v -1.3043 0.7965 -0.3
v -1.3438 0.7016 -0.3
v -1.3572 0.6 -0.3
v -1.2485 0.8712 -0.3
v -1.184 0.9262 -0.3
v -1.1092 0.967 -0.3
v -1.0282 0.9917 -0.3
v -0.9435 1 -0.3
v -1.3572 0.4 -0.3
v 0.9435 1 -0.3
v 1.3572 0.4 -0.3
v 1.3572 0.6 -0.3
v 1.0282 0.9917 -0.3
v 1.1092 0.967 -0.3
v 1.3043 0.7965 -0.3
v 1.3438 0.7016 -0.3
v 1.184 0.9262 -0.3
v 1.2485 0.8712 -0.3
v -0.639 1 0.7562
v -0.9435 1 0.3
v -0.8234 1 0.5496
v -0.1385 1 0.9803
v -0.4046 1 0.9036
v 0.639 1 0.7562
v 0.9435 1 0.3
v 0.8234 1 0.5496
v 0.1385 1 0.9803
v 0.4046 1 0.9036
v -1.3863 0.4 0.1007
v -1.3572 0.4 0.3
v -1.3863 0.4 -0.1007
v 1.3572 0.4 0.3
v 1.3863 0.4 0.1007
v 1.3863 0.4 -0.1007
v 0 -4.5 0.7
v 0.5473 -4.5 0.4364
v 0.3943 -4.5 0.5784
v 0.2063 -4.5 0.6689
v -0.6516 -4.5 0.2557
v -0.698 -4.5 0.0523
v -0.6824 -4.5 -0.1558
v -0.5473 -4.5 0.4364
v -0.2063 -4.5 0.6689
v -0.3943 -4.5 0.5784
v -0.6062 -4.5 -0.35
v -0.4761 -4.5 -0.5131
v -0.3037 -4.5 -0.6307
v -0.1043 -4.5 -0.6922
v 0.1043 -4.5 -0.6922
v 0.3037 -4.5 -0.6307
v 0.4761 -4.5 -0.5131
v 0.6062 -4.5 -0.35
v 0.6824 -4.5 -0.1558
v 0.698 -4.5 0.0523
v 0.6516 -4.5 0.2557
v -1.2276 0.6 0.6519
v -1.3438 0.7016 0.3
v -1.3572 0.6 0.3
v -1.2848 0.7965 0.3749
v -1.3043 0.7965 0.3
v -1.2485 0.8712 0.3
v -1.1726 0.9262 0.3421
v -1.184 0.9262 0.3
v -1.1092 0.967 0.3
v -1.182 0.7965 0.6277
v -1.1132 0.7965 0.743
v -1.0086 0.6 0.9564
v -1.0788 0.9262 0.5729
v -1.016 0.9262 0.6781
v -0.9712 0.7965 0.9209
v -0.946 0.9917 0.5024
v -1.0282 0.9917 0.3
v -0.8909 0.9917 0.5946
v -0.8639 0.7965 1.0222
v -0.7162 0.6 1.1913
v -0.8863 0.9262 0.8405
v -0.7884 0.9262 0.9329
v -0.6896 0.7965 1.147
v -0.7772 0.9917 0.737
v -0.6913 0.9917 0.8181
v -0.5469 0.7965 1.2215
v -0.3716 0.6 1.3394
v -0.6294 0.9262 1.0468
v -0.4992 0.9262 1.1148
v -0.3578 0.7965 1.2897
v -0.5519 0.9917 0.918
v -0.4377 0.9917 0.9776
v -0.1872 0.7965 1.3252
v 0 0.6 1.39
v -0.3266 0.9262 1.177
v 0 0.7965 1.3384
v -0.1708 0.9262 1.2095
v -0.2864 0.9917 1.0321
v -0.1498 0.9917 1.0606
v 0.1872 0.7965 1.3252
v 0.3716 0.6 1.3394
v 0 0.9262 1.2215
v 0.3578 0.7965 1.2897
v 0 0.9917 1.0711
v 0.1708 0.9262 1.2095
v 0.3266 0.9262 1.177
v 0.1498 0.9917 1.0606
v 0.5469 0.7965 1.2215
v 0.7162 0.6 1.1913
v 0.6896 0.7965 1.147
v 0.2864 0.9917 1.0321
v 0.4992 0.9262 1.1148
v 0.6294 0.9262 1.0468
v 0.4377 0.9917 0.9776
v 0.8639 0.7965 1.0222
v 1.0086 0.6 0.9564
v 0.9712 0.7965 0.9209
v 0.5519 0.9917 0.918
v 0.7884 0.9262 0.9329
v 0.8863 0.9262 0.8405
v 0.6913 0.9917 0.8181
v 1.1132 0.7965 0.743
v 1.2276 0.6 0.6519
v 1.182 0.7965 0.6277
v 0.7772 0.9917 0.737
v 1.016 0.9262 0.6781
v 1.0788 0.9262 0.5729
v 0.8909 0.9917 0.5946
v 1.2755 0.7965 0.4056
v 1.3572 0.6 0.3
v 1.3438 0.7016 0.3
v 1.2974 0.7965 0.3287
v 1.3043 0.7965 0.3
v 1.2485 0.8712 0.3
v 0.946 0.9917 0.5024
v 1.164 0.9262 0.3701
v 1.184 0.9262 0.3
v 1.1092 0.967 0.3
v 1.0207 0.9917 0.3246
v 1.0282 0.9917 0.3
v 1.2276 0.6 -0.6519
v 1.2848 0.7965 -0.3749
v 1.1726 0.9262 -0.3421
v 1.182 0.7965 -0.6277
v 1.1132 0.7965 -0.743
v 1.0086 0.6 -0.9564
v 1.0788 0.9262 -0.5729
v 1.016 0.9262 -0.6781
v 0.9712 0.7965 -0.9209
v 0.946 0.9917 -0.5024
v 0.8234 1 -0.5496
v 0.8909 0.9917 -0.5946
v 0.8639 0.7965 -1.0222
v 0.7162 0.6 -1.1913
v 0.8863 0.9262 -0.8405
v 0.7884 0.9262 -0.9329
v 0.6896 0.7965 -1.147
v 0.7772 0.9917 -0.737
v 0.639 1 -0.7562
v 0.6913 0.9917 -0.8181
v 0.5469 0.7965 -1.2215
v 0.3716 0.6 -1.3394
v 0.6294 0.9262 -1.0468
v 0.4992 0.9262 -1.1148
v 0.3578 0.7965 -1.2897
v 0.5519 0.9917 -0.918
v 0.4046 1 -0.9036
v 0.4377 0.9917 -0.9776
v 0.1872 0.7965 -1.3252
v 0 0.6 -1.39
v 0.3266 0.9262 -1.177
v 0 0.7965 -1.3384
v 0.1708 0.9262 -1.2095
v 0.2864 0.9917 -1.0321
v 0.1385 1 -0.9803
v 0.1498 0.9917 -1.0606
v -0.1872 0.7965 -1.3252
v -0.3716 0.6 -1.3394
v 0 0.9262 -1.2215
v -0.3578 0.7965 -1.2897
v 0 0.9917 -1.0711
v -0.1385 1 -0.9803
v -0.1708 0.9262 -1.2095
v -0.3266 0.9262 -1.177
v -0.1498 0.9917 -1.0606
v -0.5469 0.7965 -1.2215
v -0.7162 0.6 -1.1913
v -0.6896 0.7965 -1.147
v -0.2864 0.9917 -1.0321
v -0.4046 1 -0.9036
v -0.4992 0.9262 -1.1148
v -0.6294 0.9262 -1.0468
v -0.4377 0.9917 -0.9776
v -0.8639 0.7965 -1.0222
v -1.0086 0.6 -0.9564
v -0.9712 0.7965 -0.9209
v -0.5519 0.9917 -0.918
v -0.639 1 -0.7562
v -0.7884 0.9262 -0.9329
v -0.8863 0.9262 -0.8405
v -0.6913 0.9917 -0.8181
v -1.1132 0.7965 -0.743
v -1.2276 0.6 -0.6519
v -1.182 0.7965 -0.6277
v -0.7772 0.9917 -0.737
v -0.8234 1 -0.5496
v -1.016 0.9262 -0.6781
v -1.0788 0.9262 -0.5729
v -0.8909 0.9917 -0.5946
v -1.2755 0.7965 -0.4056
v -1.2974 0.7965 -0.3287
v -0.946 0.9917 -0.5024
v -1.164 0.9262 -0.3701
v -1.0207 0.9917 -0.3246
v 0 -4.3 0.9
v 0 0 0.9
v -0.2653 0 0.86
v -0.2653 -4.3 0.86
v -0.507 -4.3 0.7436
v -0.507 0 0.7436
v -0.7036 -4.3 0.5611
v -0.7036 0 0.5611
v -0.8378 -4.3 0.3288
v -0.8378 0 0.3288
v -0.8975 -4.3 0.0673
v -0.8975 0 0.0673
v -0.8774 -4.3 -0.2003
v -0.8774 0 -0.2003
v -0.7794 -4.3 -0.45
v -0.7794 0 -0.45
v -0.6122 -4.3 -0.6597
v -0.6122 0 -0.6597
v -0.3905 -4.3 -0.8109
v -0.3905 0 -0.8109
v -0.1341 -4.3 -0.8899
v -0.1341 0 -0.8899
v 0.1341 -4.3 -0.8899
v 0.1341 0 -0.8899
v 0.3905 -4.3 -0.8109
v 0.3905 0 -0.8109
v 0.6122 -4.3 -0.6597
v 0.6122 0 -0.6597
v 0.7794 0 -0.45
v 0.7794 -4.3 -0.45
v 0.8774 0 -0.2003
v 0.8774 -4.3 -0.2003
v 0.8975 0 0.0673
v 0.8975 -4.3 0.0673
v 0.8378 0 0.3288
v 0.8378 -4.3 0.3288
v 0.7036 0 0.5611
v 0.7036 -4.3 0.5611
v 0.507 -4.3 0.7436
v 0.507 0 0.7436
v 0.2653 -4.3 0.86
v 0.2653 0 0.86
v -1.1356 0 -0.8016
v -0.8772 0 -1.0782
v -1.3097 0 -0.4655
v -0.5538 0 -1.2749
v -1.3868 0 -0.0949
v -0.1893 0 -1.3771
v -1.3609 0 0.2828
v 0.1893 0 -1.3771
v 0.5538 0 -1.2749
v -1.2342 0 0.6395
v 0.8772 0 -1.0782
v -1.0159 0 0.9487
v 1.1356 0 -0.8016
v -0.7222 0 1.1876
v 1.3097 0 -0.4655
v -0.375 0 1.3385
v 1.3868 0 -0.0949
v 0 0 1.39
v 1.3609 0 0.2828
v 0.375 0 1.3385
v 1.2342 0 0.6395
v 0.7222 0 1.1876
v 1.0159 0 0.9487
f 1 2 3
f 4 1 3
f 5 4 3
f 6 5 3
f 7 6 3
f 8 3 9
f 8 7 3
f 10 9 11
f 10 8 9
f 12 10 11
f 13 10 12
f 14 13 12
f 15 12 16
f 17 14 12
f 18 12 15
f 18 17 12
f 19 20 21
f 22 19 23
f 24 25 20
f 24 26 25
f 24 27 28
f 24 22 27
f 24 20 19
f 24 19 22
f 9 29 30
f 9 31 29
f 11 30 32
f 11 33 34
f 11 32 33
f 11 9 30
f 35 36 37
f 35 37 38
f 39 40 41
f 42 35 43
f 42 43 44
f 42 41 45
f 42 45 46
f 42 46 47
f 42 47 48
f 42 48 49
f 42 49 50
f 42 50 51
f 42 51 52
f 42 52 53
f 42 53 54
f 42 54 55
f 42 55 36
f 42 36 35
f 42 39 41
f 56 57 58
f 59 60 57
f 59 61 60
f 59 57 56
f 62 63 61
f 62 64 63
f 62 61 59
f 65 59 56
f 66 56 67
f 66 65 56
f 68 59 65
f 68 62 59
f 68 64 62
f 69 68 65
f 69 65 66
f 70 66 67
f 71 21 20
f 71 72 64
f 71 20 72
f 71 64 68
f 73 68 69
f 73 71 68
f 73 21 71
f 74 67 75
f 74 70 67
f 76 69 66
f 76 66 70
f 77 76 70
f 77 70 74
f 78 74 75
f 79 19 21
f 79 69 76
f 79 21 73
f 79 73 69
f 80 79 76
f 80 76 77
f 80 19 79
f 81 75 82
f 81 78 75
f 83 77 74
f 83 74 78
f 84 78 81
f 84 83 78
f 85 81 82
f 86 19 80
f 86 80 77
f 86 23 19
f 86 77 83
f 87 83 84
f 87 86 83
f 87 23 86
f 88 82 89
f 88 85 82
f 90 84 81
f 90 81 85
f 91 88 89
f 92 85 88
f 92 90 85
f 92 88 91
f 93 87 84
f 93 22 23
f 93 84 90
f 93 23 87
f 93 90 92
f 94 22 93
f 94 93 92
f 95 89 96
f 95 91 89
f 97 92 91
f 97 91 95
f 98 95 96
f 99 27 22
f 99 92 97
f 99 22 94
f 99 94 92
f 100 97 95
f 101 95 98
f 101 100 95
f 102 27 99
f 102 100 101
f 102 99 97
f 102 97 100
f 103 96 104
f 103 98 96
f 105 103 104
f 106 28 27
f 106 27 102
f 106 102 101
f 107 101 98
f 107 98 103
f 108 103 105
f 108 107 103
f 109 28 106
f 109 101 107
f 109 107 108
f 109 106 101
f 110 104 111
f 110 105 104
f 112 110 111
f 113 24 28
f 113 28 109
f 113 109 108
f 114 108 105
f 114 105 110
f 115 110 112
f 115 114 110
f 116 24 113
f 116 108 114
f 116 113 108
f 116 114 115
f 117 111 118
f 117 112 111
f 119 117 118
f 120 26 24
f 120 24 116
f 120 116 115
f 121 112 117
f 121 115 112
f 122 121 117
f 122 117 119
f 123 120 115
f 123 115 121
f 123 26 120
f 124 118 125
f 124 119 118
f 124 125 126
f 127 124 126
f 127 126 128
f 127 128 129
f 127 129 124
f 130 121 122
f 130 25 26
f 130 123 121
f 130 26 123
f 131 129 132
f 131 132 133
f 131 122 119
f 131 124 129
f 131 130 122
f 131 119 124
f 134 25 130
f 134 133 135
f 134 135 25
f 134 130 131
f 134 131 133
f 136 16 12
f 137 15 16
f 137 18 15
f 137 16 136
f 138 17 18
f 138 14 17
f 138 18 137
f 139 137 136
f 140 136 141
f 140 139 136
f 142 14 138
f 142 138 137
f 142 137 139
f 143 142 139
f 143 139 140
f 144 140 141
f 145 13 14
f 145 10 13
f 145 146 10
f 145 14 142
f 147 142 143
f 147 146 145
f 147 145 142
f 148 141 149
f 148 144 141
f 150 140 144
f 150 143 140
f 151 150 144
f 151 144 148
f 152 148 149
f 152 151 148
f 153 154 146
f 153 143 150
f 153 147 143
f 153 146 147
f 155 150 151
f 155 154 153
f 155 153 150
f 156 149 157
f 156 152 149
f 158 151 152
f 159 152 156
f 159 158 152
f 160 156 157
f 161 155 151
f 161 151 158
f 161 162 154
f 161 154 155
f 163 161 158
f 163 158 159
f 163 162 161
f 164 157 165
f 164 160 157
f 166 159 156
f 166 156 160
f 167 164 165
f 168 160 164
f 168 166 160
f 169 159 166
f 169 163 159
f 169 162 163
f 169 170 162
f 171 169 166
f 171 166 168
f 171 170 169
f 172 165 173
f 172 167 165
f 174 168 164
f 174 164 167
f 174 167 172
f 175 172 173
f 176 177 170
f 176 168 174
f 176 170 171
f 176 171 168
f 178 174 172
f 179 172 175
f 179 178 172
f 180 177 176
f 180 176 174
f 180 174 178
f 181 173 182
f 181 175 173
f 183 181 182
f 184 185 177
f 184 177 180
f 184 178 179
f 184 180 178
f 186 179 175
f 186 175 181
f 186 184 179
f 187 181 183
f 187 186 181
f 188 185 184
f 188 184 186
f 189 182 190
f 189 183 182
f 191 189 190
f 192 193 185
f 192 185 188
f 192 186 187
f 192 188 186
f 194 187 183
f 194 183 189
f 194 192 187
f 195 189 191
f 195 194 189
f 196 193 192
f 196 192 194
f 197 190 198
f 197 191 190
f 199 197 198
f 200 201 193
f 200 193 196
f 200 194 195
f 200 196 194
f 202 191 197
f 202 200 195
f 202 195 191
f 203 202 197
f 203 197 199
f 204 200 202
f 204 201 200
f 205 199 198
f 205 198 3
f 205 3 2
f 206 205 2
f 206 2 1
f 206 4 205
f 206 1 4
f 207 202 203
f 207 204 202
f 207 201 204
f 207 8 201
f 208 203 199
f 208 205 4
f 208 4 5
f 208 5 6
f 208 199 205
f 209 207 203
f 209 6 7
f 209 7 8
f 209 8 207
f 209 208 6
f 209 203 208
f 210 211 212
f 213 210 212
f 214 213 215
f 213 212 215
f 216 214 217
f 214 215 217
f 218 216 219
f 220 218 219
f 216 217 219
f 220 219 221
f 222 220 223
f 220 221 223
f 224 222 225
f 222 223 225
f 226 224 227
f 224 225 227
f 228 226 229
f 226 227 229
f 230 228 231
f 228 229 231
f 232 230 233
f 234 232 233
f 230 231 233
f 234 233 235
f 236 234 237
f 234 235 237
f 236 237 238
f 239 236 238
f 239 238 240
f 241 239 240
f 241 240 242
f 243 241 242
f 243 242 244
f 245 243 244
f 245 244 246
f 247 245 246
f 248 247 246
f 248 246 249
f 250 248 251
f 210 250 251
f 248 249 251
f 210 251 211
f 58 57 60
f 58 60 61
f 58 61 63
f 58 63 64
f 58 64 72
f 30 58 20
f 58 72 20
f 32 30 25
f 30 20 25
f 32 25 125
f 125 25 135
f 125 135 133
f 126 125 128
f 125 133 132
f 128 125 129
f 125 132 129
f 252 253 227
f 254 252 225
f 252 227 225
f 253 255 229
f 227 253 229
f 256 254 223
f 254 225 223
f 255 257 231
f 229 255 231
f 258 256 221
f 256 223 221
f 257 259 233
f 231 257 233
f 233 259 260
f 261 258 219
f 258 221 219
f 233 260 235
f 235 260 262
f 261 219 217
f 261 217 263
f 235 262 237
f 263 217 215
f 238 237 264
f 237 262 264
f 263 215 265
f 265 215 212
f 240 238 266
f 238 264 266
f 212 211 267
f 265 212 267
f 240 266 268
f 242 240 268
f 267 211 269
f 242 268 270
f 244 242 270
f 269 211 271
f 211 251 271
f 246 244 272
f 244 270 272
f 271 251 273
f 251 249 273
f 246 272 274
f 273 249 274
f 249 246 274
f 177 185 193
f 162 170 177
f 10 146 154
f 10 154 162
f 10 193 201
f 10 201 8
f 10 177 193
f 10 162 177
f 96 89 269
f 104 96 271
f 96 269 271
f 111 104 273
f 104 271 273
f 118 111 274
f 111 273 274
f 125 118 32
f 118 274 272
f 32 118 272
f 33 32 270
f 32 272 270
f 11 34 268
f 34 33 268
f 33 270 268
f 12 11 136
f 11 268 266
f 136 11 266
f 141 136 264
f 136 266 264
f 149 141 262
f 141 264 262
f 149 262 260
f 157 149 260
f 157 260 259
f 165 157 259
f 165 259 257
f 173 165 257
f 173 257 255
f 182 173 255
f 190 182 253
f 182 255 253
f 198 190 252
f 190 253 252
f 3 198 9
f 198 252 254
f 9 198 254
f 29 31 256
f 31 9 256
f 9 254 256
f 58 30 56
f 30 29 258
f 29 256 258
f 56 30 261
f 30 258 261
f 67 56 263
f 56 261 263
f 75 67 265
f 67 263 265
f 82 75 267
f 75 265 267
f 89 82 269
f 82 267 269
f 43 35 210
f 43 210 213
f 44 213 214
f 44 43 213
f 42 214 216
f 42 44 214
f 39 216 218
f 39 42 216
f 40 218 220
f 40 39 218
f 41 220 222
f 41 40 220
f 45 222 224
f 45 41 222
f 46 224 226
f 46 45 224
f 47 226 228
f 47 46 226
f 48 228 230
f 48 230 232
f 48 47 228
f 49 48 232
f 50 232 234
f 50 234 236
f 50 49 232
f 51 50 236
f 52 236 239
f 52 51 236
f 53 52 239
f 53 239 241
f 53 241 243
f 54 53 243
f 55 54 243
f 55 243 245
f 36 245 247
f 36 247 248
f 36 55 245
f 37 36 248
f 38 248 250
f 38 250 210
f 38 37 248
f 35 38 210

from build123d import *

# Parameters (mm, degrees)
SKETCH_1_R          = 1.39
EXTRUDE_1_DEPTH     = 1
SKETCH_2_W          = 2.78
SKETCH_2_H          = 0.6
CUT_EXTRUDE_1_DEPTH = 0.6
FILLET_2_R          = 0.4
SKETCH_3_R          = 0.9
EXTRUDE_2_DEPTH     = 4.5
CHAMFER_1_SIZE      = 0.2


with BuildPart() as part:
    # Эскиз1 → Бобышка-Вытянуть1 (new body)
    with BuildSketch(Plane(origin=(0, 0, 0), x_dir=(1, 0, 0), z_dir=(0, 1, 0))):
        with Locations(Location((0, 0, 0), (0, 0, 270))):
            Circle(SKETCH_1_R)
    extrude(amount=EXTRUDE_1_DEPTH)

    # Эскиз2 → Вырез-Вытянуть1 (cut)
    with BuildSketch(Plane(origin=(0, 1, 0), x_dir=(1, 0, 0), z_dir=(0, 1, 0))):
        Rectangle(SKETCH_2_W, SKETCH_2_H)
    extrude(amount=-CUT_EXTRUDE_1_DEPTH, mode=Mode.SUBTRACT)

    # Скругление2
    fillet_2_edges = [part.edges().sort_by_distance(p)[0] for p in [
        (0, 1, -1.39),
        (0.870373483, 1, 1.08376658),
    ]]
    fillet(fillet_2_edges, radius=FILLET_2_R)

    # Эскиз3 → Бобышка-Вытянуть2 (add)
    with BuildSketch(Plane.XZ):
        with Locations(Location((0, 0, 0), (0, 0, 90))):
            Circle(SKETCH_3_R)
    extrude(amount=EXTRUDE_2_DEPTH)

    # Фаска1
    chamfer_1_edges = [part.edges().sort_by_distance(p)[0] for p in [
        (0, -4.5, -0.9),
    ]]
    chamfer(chamfer_1_edges, length=CHAMFER_1_SIZE)


solid = part.part
